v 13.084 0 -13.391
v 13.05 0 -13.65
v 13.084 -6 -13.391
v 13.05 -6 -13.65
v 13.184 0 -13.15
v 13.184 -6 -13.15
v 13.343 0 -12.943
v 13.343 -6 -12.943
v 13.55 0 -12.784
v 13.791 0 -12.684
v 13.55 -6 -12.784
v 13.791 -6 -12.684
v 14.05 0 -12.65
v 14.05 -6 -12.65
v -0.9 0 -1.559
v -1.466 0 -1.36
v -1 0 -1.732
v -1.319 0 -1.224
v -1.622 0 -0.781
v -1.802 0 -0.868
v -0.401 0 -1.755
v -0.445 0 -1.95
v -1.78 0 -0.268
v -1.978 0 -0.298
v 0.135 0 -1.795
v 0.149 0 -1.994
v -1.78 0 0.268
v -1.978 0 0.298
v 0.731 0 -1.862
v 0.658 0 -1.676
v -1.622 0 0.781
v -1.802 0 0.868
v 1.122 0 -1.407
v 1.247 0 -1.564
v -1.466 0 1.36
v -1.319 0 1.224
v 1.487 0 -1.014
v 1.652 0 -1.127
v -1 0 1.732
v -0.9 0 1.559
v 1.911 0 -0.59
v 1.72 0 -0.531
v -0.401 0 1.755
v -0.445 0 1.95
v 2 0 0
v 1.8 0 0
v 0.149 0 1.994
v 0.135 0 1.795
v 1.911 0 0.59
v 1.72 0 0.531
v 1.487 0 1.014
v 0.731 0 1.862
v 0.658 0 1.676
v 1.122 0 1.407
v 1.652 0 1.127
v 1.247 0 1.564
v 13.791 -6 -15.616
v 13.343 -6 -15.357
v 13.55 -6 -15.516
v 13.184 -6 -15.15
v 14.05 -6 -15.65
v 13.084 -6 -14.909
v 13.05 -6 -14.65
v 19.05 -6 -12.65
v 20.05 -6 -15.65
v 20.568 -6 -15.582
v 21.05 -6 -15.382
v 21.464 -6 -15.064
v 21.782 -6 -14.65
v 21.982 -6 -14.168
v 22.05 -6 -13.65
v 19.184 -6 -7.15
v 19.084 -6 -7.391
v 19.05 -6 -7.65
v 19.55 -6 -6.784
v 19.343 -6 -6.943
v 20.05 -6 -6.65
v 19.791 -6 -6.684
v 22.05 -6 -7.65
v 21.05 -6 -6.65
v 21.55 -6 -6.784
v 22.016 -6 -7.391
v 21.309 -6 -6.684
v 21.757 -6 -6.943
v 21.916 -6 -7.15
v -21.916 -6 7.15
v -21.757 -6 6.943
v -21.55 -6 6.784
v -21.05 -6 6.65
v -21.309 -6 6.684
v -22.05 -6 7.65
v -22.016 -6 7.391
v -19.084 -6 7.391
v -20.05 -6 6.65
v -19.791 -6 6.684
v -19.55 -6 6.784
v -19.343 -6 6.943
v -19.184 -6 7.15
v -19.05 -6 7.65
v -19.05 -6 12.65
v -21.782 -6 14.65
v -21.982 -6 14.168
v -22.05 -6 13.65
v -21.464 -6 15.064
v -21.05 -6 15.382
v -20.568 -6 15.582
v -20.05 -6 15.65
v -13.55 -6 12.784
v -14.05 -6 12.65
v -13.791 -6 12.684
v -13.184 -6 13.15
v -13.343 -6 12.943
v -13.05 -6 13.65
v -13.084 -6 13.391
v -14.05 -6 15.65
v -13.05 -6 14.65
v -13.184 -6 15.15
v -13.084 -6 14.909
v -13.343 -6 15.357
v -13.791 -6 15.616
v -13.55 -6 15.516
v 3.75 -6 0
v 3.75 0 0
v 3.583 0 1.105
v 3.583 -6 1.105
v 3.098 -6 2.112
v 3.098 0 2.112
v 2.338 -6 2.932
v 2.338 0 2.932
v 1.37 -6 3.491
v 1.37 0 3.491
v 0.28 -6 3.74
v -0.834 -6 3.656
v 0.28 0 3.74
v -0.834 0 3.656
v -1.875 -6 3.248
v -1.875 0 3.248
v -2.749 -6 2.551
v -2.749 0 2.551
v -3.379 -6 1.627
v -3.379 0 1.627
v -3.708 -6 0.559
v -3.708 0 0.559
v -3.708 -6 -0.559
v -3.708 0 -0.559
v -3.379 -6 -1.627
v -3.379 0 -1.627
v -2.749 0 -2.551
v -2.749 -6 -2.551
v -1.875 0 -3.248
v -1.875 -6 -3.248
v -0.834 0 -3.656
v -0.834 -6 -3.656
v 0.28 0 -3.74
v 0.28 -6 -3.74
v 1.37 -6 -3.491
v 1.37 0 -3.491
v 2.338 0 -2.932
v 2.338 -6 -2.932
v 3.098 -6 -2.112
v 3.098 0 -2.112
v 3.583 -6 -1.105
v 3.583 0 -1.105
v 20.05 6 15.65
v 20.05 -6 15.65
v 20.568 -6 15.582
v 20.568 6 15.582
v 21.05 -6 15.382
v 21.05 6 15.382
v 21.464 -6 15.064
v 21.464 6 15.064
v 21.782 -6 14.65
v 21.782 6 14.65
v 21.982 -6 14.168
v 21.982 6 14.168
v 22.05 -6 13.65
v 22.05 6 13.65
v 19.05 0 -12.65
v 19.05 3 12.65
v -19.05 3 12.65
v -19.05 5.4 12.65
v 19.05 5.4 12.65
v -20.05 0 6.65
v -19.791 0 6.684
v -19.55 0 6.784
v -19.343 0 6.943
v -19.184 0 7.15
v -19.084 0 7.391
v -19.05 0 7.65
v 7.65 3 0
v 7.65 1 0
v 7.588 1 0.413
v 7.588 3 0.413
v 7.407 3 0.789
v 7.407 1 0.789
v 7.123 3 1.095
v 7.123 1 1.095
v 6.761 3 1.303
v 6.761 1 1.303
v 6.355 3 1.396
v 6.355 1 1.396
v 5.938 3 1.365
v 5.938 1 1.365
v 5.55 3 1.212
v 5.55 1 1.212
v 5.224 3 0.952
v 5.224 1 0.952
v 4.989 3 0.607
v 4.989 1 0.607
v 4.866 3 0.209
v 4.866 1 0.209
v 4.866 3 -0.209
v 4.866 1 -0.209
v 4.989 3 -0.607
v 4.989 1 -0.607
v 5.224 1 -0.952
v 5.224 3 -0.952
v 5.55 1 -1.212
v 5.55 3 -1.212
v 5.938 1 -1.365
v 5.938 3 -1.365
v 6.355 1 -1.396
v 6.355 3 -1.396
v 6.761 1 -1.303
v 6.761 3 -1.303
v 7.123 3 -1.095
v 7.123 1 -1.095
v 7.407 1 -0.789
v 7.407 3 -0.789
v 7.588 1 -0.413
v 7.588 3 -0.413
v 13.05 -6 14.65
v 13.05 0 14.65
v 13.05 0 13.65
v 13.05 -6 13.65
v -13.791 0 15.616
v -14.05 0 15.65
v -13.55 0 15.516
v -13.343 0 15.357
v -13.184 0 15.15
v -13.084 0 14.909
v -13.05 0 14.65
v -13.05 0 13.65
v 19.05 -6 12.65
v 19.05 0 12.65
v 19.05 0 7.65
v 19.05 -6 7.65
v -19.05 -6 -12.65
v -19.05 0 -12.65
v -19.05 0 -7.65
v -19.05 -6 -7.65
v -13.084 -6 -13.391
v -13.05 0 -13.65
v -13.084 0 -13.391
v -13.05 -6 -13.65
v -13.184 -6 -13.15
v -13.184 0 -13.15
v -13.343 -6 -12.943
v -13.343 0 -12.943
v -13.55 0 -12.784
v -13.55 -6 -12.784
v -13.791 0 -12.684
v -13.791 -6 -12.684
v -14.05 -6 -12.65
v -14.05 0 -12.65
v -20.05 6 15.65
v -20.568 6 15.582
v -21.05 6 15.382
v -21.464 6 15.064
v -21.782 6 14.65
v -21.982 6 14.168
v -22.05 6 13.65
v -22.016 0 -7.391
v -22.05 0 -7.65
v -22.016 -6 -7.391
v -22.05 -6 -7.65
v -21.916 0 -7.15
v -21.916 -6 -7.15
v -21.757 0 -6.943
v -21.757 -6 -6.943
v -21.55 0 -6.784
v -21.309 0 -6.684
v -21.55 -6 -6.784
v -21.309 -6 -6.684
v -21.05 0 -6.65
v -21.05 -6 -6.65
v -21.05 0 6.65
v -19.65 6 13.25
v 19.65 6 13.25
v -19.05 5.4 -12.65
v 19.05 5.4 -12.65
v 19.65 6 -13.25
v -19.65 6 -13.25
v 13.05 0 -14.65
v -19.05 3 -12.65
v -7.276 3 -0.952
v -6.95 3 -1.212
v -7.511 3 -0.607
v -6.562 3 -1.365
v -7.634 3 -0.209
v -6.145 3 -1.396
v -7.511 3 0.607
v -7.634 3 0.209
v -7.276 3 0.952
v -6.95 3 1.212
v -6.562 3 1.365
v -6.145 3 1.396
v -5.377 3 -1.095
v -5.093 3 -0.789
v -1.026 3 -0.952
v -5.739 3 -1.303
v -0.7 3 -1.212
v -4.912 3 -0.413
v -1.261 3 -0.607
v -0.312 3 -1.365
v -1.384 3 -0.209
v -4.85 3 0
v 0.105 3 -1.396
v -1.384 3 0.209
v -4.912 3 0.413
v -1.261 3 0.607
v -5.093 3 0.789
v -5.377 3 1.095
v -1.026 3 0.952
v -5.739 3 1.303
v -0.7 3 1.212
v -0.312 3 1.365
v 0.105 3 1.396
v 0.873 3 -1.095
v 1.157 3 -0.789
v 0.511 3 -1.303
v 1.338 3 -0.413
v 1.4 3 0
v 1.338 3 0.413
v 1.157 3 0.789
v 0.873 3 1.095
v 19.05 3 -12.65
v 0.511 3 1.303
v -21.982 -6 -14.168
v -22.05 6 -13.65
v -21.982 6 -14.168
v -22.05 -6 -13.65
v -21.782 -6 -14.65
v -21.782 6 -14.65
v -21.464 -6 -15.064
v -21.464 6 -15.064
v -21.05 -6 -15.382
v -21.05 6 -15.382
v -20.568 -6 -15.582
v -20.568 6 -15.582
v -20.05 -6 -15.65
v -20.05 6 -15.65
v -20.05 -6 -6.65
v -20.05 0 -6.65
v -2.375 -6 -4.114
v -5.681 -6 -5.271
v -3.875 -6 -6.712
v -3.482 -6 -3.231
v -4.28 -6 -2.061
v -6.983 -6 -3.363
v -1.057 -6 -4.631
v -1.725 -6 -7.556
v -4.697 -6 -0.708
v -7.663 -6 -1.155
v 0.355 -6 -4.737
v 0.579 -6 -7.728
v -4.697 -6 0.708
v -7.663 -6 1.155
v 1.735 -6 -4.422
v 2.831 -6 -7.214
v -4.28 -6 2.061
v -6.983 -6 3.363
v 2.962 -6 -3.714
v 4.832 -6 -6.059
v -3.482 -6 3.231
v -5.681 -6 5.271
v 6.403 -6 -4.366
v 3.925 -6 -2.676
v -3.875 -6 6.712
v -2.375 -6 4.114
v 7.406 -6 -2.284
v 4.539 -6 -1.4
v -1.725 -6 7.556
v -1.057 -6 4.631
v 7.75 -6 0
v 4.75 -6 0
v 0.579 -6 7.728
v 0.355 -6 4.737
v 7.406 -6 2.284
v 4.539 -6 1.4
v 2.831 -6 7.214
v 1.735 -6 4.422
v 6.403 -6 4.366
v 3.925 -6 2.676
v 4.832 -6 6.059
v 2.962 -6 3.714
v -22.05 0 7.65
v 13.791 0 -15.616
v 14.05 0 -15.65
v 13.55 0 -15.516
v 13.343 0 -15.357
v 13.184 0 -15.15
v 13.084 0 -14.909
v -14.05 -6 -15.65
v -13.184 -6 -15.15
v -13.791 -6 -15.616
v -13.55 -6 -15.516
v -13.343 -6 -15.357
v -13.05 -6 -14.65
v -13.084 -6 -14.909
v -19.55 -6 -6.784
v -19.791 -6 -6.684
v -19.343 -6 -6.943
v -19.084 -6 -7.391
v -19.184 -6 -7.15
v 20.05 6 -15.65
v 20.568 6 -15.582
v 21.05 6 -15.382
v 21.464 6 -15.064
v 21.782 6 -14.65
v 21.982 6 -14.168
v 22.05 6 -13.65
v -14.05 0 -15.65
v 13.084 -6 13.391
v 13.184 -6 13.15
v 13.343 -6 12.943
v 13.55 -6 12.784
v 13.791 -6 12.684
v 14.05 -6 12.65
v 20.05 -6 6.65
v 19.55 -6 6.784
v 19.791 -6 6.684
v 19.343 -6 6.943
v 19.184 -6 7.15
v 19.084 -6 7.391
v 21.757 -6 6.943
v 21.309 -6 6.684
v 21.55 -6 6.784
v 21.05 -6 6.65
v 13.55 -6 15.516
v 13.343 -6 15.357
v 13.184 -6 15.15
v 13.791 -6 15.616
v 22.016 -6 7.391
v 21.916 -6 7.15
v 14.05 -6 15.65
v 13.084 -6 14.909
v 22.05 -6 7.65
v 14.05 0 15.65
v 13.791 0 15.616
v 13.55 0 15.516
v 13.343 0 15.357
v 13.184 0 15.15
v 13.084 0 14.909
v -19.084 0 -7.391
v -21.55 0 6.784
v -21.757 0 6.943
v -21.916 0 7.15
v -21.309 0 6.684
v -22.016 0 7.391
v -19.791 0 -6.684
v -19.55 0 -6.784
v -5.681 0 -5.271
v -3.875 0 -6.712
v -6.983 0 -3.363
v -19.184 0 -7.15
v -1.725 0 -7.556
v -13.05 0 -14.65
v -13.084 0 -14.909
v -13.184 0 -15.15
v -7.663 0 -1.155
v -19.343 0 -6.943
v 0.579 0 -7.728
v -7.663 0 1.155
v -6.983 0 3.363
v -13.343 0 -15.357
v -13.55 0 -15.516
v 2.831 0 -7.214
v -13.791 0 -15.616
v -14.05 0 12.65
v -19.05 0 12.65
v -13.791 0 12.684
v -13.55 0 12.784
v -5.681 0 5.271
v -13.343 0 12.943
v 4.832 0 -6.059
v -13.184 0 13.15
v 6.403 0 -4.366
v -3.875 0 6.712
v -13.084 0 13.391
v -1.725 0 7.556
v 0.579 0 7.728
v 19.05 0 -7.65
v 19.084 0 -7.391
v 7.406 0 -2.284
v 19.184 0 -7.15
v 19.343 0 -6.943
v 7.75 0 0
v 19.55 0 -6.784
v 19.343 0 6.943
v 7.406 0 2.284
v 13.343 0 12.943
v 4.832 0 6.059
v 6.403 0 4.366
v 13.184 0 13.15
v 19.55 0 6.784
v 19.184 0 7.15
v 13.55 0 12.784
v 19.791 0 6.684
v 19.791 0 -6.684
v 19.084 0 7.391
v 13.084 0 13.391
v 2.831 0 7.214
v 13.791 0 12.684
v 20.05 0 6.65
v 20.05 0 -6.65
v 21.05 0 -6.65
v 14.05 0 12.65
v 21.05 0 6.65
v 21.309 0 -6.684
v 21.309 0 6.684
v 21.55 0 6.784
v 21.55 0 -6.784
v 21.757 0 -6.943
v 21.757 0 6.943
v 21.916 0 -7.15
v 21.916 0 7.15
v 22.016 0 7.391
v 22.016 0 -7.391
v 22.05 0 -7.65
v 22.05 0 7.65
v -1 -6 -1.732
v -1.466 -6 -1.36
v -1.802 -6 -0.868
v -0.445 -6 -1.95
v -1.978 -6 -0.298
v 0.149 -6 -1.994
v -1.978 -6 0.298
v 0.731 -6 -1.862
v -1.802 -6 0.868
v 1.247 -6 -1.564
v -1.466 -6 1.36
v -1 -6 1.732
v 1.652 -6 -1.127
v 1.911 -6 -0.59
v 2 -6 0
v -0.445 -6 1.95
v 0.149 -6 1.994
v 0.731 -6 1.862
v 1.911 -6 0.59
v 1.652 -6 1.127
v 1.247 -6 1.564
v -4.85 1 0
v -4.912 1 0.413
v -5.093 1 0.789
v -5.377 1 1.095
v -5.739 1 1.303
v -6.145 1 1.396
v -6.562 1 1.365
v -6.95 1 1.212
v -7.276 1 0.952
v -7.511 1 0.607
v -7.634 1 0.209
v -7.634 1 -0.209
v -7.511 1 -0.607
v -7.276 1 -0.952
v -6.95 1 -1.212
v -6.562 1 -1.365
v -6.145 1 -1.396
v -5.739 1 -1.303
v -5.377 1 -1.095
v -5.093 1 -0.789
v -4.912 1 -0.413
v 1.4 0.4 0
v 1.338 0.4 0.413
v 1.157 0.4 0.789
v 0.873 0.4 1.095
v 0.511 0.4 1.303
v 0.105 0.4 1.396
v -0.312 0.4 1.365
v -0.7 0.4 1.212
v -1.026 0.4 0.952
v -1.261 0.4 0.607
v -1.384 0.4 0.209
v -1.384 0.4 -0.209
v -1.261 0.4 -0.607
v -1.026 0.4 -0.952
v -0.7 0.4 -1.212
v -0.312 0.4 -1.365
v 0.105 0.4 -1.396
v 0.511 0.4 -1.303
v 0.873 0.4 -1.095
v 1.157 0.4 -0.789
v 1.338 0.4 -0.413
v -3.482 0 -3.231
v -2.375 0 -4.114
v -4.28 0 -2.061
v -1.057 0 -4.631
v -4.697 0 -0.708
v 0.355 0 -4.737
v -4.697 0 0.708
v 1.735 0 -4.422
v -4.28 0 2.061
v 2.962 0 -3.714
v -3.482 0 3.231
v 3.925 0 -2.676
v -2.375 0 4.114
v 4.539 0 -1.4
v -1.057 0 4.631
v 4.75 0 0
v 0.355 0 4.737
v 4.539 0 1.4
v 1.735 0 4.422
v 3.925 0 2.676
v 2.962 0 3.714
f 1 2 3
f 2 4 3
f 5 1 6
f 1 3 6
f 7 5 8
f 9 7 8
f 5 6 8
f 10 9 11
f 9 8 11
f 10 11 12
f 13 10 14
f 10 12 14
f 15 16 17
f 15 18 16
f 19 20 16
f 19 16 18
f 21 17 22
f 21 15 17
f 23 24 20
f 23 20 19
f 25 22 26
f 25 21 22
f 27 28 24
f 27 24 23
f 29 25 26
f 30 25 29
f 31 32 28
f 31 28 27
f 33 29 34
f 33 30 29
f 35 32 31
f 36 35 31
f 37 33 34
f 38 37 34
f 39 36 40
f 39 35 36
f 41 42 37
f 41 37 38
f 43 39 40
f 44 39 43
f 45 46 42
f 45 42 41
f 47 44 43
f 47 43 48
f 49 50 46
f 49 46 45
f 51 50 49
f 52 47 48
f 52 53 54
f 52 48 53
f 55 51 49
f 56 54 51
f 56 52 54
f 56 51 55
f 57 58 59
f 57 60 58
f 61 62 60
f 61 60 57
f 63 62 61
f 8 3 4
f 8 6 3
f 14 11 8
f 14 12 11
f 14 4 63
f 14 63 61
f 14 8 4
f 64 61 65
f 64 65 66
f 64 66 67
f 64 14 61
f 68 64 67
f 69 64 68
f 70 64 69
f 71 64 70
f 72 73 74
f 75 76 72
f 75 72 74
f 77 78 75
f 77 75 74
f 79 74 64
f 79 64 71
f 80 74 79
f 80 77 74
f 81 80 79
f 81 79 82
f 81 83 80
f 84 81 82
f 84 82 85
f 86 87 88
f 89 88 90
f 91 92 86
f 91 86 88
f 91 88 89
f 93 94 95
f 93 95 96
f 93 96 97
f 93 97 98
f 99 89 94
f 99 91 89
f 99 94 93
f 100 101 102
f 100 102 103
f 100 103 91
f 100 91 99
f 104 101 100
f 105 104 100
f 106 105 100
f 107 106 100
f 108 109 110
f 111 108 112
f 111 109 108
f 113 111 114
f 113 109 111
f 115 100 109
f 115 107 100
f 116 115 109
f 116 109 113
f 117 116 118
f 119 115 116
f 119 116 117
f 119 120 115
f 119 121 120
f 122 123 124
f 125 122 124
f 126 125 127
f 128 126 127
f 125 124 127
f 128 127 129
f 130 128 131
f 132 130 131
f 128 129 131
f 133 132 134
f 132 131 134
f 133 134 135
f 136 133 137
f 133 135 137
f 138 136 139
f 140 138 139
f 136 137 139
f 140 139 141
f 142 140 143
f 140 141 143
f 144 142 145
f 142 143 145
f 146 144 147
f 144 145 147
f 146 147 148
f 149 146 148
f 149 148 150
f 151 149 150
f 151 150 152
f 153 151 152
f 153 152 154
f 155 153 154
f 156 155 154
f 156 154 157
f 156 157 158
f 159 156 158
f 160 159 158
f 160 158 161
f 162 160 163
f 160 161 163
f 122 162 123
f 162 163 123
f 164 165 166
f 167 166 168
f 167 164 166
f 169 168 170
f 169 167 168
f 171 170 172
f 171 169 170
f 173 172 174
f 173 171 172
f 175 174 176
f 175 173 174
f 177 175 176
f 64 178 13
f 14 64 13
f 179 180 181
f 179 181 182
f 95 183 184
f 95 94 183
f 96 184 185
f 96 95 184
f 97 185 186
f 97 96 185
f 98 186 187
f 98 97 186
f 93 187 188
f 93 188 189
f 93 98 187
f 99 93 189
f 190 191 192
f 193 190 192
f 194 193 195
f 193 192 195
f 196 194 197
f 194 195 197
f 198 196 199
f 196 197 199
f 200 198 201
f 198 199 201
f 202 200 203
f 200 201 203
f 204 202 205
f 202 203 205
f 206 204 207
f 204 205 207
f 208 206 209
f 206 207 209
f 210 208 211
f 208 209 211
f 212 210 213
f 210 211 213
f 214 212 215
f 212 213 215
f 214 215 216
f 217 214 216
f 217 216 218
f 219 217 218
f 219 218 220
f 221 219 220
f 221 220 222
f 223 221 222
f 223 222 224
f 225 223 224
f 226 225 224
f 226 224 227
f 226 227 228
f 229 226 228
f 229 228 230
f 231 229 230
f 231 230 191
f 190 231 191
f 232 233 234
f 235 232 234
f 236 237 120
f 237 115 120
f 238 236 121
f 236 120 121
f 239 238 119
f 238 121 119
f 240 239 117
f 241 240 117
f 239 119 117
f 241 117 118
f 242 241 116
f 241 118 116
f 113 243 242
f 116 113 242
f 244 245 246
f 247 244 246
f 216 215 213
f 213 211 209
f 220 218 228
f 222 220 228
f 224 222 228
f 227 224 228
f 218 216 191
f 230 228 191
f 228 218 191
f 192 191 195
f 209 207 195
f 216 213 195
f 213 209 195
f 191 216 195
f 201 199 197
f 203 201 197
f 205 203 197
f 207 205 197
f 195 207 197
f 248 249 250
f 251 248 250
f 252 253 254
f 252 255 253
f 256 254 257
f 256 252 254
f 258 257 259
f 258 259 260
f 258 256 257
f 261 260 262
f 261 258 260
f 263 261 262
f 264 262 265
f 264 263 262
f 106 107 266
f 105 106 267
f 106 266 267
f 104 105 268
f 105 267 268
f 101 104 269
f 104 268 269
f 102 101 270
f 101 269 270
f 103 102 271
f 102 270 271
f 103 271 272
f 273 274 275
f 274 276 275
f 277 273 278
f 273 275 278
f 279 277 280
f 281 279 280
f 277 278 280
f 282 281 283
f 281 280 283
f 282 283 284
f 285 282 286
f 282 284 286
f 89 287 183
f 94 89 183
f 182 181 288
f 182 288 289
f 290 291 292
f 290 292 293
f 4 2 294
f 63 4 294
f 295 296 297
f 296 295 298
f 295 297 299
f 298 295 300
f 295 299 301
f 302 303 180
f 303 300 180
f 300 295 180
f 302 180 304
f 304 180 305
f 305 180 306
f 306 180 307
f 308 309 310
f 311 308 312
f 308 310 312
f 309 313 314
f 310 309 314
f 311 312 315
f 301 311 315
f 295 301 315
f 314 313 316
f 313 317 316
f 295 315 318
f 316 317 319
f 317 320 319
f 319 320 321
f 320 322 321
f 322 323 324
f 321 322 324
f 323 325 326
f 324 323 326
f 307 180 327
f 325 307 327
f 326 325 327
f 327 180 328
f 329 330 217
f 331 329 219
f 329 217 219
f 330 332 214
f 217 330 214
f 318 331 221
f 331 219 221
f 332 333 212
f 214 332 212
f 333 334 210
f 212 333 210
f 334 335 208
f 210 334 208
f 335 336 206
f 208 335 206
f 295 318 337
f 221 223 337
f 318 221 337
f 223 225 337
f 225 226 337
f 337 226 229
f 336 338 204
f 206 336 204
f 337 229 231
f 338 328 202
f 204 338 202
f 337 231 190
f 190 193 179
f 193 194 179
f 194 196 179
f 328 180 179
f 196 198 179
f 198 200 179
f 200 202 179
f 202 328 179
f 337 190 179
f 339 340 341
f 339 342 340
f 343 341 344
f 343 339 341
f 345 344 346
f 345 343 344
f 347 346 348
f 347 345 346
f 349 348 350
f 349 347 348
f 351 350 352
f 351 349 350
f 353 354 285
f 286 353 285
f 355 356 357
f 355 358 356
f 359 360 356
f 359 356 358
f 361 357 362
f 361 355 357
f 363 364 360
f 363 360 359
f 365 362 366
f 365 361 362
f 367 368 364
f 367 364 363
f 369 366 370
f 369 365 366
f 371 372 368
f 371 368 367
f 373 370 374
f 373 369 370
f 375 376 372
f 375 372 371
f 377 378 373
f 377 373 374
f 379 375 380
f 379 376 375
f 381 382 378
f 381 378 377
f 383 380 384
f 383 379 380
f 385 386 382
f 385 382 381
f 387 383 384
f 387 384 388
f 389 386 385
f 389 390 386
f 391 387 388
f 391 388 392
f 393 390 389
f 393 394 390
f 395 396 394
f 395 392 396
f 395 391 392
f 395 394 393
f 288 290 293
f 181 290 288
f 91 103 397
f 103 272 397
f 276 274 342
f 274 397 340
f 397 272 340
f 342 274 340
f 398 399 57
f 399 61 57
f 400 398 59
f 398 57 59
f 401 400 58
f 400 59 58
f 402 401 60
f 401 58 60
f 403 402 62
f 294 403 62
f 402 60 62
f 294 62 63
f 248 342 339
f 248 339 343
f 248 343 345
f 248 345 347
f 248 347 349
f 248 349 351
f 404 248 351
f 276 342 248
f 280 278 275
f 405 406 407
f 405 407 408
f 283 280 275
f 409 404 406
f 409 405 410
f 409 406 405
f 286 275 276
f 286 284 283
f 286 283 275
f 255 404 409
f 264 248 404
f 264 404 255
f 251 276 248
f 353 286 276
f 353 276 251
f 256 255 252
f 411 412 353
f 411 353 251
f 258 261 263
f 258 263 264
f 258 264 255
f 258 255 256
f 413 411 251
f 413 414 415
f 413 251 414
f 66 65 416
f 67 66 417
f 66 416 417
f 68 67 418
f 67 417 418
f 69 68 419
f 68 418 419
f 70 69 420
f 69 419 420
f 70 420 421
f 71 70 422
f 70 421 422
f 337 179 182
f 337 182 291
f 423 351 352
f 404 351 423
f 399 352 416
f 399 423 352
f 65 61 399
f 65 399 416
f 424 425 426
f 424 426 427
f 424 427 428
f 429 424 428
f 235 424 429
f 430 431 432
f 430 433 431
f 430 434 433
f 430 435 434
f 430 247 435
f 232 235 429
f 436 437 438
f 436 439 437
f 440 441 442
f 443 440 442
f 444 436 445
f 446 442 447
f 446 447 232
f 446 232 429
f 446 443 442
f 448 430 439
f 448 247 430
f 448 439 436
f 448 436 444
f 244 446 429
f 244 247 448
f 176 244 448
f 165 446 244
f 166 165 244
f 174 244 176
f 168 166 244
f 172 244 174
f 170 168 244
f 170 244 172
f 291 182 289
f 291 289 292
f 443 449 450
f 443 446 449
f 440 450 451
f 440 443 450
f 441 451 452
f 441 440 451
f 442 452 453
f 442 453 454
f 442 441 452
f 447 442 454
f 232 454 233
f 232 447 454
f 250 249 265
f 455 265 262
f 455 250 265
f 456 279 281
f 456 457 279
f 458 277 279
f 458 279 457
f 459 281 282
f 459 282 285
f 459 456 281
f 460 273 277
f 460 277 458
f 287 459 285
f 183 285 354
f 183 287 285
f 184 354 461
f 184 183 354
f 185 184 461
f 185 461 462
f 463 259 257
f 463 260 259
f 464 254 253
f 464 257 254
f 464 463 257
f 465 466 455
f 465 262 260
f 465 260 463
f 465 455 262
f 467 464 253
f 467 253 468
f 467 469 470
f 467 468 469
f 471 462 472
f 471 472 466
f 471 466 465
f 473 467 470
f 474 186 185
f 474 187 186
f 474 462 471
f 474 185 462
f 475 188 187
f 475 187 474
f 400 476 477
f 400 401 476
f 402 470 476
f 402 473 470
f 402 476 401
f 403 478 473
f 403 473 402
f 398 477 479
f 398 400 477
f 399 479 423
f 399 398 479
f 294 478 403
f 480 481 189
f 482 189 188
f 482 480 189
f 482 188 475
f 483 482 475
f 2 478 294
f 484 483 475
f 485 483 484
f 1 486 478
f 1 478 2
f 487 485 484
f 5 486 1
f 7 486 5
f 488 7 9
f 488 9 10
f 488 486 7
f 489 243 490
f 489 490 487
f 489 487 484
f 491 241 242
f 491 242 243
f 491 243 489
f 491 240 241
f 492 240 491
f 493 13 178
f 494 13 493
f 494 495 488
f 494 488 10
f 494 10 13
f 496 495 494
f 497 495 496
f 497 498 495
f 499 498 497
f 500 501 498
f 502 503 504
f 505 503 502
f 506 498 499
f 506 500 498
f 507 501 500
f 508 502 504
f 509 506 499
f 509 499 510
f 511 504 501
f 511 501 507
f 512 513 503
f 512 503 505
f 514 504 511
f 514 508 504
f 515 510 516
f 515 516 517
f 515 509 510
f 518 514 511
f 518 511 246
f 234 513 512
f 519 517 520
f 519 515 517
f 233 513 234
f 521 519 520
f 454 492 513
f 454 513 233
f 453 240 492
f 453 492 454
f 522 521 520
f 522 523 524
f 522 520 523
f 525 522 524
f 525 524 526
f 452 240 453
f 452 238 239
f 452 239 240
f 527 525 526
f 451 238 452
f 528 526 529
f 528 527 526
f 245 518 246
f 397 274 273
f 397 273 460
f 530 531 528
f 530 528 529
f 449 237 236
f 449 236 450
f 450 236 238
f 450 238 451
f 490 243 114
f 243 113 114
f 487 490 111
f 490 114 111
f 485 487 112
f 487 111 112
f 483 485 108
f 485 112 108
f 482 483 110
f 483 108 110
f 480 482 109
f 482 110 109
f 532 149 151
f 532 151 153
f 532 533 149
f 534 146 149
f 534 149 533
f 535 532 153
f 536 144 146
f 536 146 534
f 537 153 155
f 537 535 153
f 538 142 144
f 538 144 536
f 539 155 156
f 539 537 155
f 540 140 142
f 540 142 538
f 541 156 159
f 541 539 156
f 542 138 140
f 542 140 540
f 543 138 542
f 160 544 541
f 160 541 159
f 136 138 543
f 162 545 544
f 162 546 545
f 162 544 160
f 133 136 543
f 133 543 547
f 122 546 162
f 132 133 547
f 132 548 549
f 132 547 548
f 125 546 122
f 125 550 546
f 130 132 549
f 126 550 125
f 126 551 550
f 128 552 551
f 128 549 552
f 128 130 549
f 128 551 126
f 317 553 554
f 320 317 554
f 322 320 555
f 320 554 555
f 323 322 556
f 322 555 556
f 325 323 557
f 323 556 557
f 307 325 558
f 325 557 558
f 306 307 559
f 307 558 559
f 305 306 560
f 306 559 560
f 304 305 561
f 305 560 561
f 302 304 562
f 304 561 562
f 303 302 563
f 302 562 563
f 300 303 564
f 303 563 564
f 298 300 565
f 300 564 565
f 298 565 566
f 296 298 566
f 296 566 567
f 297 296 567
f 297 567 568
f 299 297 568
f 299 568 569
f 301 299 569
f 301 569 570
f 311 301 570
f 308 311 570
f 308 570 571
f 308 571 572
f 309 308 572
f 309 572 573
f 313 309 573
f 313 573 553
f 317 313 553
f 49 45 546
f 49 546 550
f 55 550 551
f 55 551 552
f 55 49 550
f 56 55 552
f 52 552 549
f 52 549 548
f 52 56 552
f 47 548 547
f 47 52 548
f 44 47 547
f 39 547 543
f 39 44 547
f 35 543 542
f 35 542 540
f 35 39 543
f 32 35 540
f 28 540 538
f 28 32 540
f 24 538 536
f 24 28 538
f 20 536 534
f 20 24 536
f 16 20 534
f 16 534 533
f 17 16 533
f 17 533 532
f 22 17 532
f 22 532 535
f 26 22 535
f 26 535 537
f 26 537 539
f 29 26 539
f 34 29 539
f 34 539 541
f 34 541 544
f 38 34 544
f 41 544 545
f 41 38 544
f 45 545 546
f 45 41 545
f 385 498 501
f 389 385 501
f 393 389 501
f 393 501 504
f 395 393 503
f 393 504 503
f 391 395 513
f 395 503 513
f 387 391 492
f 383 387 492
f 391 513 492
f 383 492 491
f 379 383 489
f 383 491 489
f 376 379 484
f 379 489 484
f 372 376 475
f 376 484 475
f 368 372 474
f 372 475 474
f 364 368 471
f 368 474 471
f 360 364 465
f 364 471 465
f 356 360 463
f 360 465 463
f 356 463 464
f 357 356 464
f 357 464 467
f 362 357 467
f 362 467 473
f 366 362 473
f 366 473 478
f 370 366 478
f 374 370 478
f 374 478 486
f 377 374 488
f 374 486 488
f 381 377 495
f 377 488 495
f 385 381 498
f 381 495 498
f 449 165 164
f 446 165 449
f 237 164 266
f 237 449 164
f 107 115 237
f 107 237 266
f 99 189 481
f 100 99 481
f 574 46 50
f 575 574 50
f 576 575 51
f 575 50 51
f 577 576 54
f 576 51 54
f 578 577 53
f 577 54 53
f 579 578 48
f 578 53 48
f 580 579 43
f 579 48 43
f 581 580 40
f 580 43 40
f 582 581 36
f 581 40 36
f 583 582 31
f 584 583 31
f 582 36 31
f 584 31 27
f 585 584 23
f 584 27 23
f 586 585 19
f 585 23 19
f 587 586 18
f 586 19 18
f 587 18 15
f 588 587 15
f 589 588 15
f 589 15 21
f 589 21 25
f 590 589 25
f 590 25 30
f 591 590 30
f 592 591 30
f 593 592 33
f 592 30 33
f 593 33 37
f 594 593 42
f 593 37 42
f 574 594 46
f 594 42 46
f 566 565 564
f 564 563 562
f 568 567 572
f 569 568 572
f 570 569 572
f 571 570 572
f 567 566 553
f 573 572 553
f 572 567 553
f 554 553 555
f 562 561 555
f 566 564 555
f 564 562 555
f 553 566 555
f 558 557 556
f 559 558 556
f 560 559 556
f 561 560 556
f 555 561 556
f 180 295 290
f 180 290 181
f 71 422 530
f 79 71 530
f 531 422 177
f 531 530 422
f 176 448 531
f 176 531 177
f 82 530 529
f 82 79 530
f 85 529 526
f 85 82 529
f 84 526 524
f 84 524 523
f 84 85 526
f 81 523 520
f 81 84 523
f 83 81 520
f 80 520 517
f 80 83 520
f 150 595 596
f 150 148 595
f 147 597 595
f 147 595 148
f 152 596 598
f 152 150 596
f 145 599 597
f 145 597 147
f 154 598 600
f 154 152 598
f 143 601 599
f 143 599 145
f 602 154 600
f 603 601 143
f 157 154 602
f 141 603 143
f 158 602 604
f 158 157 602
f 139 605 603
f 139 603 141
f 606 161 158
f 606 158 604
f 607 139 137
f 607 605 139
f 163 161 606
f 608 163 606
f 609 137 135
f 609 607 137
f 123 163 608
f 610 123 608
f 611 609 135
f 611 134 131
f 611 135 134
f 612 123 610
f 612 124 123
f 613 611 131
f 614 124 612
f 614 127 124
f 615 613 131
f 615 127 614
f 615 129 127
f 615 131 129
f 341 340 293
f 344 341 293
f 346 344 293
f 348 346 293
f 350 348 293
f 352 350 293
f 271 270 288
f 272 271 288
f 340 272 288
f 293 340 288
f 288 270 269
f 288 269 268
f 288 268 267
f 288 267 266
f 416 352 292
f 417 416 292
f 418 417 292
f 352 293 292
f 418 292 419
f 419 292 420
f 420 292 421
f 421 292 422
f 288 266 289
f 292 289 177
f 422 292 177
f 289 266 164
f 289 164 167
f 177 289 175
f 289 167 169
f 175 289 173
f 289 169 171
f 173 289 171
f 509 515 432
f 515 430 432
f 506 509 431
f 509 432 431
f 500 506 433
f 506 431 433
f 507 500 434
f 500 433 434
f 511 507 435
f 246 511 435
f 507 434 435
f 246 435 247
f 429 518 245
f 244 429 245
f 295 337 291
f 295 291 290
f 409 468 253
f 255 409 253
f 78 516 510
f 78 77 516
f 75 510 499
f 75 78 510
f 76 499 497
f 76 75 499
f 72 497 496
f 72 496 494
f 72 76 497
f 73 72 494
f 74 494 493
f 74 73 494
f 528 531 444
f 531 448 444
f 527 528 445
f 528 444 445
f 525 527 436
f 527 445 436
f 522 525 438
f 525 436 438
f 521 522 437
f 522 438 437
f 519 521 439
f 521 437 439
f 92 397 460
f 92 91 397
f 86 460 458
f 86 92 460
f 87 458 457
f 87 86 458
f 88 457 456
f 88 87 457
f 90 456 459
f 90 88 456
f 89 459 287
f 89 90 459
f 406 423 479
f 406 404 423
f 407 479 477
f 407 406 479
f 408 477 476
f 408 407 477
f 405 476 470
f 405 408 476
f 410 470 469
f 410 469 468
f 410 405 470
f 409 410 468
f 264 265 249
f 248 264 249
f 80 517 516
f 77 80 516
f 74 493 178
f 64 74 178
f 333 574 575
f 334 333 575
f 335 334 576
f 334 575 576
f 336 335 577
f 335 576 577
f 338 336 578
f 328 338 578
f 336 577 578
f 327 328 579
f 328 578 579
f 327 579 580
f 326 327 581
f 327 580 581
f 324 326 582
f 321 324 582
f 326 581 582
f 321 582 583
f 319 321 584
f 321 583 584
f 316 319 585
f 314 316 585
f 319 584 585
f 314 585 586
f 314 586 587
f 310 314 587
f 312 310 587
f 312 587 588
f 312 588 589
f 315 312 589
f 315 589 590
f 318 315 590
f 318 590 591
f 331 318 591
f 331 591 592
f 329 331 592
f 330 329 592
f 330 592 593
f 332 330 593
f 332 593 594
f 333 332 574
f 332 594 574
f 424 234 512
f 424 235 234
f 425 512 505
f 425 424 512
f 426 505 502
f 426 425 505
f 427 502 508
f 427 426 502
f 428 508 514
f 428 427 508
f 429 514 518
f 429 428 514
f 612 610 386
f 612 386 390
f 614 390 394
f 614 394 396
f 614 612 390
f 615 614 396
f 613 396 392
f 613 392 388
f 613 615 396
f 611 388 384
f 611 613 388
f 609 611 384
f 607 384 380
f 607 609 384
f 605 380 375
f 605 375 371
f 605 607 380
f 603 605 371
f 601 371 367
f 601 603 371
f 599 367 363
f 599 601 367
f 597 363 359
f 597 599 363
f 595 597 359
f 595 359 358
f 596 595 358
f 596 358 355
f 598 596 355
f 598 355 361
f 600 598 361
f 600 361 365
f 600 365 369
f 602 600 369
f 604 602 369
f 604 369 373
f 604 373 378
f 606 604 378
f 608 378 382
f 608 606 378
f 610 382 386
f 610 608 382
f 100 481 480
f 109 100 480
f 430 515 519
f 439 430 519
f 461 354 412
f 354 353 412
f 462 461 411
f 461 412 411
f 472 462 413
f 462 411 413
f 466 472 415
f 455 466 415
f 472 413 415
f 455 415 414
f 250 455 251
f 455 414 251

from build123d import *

# Parameters (mm, degrees)
F0_R     = 9.5
F0_R_2   = 7.75
F0_R_3   = 1.4
F0_R_4   = 4.75
F0_R_5   = 3.75
F0_R_6   = 2
F1_DEPTH = 3
F0_W     = 26.1
F0_H     = 3
F0_W_2   = 3
F0_H_2   = 13.3
F2_DEPTH = 6
F3_DEPTH = 1
F4_DEPTH = 6
F5_DEPTH = 6
F6_DEPTH = 6
F7_SIZE  = 0.6
F8_DEPTH = 3
F9_R     = 2
F10_SIZE = 0.4
F11_R    = 1


with BuildPart() as f1:
    # F0 (on Front) → F1 (new body)
    with BuildSketch(Plane.XZ):
        Polygon((-13.05, 12.65), (-19.05, 12.65), (-19.05, 6.65), (-19.05, -6.65), (-19.05, -12.65), (-13.05, -12.65), (13.05, -12.65), (19.05, -12.65), (19.05, -6.65), (19.05, 6.65), (19.05, 12.65), (13.05, 12.65), align=None)
        Circle(F0_R, mode=Mode.SUBTRACT)
        Circle(F0_R)
        Circle(F0_R_2, mode=Mode.SUBTRACT)
        Circle(F0_R_2)
        with Locations((-6.25, 0)):
            Circle(F0_R_3, mode=Mode.SUBTRACT)
        Circle(F0_R_4, mode=Mode.SUBTRACT)
        with Locations((6.25, 0)):
            Circle(F0_R_3, mode=Mode.SUBTRACT)
        Circle(F0_R_4)
        Circle(F0_R_5, mode=Mode.SUBTRACT)
        Circle(F0_R_5)
        Circle(F0_R_6, mode=Mode.SUBTRACT)
    extrude(amount=-F1_DEPTH)

    # F0 (on Front) → F2 (join)
    with BuildSketch(Plane.XZ):
        Polygon((-19.05, 6.65), (-19.05, 12.65), (-13.05, 12.65), (-13.05, 15.65), (-22.05, 15.65), (-22.05, 6.65), align=None)
        Polygon((13.05, 15.65), (13.05, 12.65), (19.05, 12.65), (19.05, 6.65), (22.05, 6.65), (22.05, 15.65), align=None)
        with Locations((0, -14.15)):
            Rectangle(F0_W, F0_H)
        with Locations((0, 14.15)):
            Rectangle(F0_W, F0_H)
        with Locations((-20.55, 0)):
            Rectangle(F0_W_2, F0_H_2)
        Polygon((-19.05, -12.65), (-19.05, -6.65), (-22.05, -6.65), (-22.05, -15.65), (-13.05, -15.65), (-13.05, -12.65), align=None)
        Polygon((22.05, -6.65), (19.05, -6.65), (19.05, -12.65), (13.05, -12.65), (13.05, -15.65), (22.05, -15.65), align=None)
        with Locations((20.55, 0)):
            Rectangle(F0_W_2, F0_H_2)
    extrude(amount=-F2_DEPTH)

    # F0 (on Front) → F3 (join)
    with BuildSketch(Plane.XZ):
        with Locations((-6.25, 0)):
            Circle(F0_R_3)
        with Locations((6.25, 0)):
            Circle(F0_R_3)
    extrude(amount=-F3_DEPTH)

    # F0 (on Front) → F4 (join)
    with BuildSketch(Plane.XZ):
        Circle(F0_R_5)
        Circle(F0_R_6, mode=Mode.SUBTRACT)
    extrude(amount=F4_DEPTH)

    # F0 (on Front) → F5 (join)
    with BuildSketch(Plane.XZ):
        Polygon((-19.05, 6.65), (-19.05, 12.65), (-13.05, 12.65), (-13.05, 15.65), (-22.05, 15.65), (-22.05, 6.65), align=None)
        Polygon((13.05, 15.65), (13.05, 12.65), (19.05, 12.65), (19.05, 6.65), (22.05, 6.65), (22.05, 15.65), align=None)
        Polygon((-19.05, -12.65), (-19.05, -6.65), (-22.05, -6.65), (-22.05, -15.65), (-13.05, -15.65), (-13.05, -12.65), align=None)
        Polygon((22.05, -6.65), (19.05, -6.65), (19.05, -12.65), (13.05, -12.65), (13.05, -15.65), (22.05, -15.65), align=None)
    extrude(amount=F5_DEPTH)

    # F0 (on Front) → F6 (join)
    with BuildSketch(Plane.XZ):
        Circle(F0_R_2)
        with Locations((-6.25, 0)):
            Circle(F0_R_3, mode=Mode.SUBTRACT)
        Circle(F0_R_4, mode=Mode.SUBTRACT)
        with Locations((6.25, 0)):
            Circle(F0_R_3, mode=Mode.SUBTRACT)
        with Locations((-6.25, 0)):
            Circle(F0_R_3)
        with Locations((6.25, 0)):
            Circle(F0_R_3)
    extrude(amount=F6_DEPTH)

    # F7
    f7_edges = [f1.edges().sort_by_distance(p)[0] for p in [
        (0, 6, 12.65),
        (-19.05, 6, 0),
        (19.05, 6, 0),
        (0, 6, -12.65),
    ]]
    chamfer(f7_edges, length=F7_SIZE)

    # F0 (on Front) → F8 (join)
    with BuildSketch(Plane.XZ):
        Circle(F0_R_6)
        Circle(F0_R_3, mode=Mode.SUBTRACT)
    extrude(amount=-F8_DEPTH)

    # F9
    f9_edges = [f1.edges().sort_by_distance(p)[0] for p in [
        (22.05, 0, 15.65),
        (-22.05, 0, 15.65),
        (-22.05, 0, -15.65),
        (22.05, 0, -15.65),
    ]]
    fillet(f9_edges, radius=F9_R)

    # F10
    f10_edges = [f1.edges().sort_by_distance(p)[0] for p in [
        (-1.4, 0, 0),
    ]]
    chamfer(f10_edges, length=F10_SIZE)

    # F11
    f11_edges = [f1.edges().sort_by_distance(p)[0] for p in [
        (-22.05, -3, 6.65),
        (-19.05, -3, 6.65),
        (-13.05, -3, 12.65),
        (-13.05, -3, 15.65),
        (13.05, -3, 12.65),
        (19.05, -3, 6.65),
        (22.05, -3, 6.65),
        (-13.05, -3, -15.65),
        (13.05, -3, -15.65),
        (-22.05, -3, -6.65),
        (-19.05, -3, -6.65),
        (13.05, -3, 15.65),
        (22.05, -3, -6.65),
        (19.05, -3, -6.65),
        (13.05, -3, -12.65),
        (-13.05, -3, -12.65),
    ]]
    fillet(f11_edges, radius=F11_R)


solid = f1.part
